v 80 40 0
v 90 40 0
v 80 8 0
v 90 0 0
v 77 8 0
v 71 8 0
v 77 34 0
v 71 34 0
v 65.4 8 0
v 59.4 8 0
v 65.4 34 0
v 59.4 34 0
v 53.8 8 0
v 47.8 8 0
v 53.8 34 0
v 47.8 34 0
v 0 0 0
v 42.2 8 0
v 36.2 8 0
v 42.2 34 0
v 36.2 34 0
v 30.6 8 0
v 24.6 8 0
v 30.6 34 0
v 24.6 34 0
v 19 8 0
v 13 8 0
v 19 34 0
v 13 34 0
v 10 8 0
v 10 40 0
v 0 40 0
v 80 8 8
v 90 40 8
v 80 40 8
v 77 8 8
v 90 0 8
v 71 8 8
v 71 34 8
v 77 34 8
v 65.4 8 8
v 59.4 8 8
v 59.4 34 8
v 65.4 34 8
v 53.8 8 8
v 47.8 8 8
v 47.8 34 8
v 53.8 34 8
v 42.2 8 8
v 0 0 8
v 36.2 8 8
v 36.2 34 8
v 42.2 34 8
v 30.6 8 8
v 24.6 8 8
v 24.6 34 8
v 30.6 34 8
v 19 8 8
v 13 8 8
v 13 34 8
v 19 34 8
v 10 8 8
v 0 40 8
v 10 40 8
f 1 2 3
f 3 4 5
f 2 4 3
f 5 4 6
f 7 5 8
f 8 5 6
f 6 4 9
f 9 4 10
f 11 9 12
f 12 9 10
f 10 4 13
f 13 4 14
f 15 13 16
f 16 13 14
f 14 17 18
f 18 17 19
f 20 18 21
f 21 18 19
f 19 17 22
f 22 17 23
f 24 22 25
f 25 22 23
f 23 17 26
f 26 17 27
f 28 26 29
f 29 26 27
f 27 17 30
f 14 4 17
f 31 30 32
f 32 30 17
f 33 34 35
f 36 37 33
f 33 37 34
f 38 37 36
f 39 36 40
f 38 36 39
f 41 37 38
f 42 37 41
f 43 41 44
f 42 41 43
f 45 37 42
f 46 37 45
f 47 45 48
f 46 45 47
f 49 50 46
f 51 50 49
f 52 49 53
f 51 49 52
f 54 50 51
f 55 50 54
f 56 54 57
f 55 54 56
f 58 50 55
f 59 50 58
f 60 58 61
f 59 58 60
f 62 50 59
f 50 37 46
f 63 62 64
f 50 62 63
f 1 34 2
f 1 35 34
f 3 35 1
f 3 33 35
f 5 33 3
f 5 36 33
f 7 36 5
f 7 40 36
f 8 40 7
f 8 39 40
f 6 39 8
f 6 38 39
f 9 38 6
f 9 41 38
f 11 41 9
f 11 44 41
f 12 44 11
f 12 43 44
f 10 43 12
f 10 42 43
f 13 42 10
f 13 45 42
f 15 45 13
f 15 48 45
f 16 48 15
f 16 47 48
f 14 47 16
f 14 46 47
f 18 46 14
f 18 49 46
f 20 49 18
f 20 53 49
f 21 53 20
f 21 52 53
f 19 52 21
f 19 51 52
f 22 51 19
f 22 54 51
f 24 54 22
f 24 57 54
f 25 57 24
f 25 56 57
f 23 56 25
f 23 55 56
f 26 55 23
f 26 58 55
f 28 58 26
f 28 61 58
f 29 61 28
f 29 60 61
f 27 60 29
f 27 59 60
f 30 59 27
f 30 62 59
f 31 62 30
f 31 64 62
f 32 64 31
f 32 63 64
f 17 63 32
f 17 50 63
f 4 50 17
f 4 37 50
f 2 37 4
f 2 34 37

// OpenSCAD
$fn = 32;

// ----------------------------------------------------------------------
// Guard grille: 6 slats over a 90 x 40 mm plate
// ----------------------------------------------------------------------

// --- parameters (mm) ---
profile_height = 8;       // extrusion height
profile_points = 32;      // points of the closed outline

profile = [[0, 0], [90, 0], [90, 40], [80, 40], [80, 8], [77, 8], [77, 34], [71, 34], [71, 8], [65.4, 8], [65.4, 34], [59.4, 34], [59.4, 8], [53.8, 8], [53.8, 34], [47.8, 34], [47.8, 8], [42.2, 8], [42.2, 34], [36.2, 34], [36.2, 8], [30.6, 8], [30.6, 34], [24.6, 34], [24.6, 8], [19, 8], [19, 34], [13, 34], [13, 8], [10, 8], [10, 40], [0, 40]];  // single closed polygon, 32 points, counter clockwise

// --- the one profile operation ---
linear_extrude(height = profile_height) polygon(points = profile);
